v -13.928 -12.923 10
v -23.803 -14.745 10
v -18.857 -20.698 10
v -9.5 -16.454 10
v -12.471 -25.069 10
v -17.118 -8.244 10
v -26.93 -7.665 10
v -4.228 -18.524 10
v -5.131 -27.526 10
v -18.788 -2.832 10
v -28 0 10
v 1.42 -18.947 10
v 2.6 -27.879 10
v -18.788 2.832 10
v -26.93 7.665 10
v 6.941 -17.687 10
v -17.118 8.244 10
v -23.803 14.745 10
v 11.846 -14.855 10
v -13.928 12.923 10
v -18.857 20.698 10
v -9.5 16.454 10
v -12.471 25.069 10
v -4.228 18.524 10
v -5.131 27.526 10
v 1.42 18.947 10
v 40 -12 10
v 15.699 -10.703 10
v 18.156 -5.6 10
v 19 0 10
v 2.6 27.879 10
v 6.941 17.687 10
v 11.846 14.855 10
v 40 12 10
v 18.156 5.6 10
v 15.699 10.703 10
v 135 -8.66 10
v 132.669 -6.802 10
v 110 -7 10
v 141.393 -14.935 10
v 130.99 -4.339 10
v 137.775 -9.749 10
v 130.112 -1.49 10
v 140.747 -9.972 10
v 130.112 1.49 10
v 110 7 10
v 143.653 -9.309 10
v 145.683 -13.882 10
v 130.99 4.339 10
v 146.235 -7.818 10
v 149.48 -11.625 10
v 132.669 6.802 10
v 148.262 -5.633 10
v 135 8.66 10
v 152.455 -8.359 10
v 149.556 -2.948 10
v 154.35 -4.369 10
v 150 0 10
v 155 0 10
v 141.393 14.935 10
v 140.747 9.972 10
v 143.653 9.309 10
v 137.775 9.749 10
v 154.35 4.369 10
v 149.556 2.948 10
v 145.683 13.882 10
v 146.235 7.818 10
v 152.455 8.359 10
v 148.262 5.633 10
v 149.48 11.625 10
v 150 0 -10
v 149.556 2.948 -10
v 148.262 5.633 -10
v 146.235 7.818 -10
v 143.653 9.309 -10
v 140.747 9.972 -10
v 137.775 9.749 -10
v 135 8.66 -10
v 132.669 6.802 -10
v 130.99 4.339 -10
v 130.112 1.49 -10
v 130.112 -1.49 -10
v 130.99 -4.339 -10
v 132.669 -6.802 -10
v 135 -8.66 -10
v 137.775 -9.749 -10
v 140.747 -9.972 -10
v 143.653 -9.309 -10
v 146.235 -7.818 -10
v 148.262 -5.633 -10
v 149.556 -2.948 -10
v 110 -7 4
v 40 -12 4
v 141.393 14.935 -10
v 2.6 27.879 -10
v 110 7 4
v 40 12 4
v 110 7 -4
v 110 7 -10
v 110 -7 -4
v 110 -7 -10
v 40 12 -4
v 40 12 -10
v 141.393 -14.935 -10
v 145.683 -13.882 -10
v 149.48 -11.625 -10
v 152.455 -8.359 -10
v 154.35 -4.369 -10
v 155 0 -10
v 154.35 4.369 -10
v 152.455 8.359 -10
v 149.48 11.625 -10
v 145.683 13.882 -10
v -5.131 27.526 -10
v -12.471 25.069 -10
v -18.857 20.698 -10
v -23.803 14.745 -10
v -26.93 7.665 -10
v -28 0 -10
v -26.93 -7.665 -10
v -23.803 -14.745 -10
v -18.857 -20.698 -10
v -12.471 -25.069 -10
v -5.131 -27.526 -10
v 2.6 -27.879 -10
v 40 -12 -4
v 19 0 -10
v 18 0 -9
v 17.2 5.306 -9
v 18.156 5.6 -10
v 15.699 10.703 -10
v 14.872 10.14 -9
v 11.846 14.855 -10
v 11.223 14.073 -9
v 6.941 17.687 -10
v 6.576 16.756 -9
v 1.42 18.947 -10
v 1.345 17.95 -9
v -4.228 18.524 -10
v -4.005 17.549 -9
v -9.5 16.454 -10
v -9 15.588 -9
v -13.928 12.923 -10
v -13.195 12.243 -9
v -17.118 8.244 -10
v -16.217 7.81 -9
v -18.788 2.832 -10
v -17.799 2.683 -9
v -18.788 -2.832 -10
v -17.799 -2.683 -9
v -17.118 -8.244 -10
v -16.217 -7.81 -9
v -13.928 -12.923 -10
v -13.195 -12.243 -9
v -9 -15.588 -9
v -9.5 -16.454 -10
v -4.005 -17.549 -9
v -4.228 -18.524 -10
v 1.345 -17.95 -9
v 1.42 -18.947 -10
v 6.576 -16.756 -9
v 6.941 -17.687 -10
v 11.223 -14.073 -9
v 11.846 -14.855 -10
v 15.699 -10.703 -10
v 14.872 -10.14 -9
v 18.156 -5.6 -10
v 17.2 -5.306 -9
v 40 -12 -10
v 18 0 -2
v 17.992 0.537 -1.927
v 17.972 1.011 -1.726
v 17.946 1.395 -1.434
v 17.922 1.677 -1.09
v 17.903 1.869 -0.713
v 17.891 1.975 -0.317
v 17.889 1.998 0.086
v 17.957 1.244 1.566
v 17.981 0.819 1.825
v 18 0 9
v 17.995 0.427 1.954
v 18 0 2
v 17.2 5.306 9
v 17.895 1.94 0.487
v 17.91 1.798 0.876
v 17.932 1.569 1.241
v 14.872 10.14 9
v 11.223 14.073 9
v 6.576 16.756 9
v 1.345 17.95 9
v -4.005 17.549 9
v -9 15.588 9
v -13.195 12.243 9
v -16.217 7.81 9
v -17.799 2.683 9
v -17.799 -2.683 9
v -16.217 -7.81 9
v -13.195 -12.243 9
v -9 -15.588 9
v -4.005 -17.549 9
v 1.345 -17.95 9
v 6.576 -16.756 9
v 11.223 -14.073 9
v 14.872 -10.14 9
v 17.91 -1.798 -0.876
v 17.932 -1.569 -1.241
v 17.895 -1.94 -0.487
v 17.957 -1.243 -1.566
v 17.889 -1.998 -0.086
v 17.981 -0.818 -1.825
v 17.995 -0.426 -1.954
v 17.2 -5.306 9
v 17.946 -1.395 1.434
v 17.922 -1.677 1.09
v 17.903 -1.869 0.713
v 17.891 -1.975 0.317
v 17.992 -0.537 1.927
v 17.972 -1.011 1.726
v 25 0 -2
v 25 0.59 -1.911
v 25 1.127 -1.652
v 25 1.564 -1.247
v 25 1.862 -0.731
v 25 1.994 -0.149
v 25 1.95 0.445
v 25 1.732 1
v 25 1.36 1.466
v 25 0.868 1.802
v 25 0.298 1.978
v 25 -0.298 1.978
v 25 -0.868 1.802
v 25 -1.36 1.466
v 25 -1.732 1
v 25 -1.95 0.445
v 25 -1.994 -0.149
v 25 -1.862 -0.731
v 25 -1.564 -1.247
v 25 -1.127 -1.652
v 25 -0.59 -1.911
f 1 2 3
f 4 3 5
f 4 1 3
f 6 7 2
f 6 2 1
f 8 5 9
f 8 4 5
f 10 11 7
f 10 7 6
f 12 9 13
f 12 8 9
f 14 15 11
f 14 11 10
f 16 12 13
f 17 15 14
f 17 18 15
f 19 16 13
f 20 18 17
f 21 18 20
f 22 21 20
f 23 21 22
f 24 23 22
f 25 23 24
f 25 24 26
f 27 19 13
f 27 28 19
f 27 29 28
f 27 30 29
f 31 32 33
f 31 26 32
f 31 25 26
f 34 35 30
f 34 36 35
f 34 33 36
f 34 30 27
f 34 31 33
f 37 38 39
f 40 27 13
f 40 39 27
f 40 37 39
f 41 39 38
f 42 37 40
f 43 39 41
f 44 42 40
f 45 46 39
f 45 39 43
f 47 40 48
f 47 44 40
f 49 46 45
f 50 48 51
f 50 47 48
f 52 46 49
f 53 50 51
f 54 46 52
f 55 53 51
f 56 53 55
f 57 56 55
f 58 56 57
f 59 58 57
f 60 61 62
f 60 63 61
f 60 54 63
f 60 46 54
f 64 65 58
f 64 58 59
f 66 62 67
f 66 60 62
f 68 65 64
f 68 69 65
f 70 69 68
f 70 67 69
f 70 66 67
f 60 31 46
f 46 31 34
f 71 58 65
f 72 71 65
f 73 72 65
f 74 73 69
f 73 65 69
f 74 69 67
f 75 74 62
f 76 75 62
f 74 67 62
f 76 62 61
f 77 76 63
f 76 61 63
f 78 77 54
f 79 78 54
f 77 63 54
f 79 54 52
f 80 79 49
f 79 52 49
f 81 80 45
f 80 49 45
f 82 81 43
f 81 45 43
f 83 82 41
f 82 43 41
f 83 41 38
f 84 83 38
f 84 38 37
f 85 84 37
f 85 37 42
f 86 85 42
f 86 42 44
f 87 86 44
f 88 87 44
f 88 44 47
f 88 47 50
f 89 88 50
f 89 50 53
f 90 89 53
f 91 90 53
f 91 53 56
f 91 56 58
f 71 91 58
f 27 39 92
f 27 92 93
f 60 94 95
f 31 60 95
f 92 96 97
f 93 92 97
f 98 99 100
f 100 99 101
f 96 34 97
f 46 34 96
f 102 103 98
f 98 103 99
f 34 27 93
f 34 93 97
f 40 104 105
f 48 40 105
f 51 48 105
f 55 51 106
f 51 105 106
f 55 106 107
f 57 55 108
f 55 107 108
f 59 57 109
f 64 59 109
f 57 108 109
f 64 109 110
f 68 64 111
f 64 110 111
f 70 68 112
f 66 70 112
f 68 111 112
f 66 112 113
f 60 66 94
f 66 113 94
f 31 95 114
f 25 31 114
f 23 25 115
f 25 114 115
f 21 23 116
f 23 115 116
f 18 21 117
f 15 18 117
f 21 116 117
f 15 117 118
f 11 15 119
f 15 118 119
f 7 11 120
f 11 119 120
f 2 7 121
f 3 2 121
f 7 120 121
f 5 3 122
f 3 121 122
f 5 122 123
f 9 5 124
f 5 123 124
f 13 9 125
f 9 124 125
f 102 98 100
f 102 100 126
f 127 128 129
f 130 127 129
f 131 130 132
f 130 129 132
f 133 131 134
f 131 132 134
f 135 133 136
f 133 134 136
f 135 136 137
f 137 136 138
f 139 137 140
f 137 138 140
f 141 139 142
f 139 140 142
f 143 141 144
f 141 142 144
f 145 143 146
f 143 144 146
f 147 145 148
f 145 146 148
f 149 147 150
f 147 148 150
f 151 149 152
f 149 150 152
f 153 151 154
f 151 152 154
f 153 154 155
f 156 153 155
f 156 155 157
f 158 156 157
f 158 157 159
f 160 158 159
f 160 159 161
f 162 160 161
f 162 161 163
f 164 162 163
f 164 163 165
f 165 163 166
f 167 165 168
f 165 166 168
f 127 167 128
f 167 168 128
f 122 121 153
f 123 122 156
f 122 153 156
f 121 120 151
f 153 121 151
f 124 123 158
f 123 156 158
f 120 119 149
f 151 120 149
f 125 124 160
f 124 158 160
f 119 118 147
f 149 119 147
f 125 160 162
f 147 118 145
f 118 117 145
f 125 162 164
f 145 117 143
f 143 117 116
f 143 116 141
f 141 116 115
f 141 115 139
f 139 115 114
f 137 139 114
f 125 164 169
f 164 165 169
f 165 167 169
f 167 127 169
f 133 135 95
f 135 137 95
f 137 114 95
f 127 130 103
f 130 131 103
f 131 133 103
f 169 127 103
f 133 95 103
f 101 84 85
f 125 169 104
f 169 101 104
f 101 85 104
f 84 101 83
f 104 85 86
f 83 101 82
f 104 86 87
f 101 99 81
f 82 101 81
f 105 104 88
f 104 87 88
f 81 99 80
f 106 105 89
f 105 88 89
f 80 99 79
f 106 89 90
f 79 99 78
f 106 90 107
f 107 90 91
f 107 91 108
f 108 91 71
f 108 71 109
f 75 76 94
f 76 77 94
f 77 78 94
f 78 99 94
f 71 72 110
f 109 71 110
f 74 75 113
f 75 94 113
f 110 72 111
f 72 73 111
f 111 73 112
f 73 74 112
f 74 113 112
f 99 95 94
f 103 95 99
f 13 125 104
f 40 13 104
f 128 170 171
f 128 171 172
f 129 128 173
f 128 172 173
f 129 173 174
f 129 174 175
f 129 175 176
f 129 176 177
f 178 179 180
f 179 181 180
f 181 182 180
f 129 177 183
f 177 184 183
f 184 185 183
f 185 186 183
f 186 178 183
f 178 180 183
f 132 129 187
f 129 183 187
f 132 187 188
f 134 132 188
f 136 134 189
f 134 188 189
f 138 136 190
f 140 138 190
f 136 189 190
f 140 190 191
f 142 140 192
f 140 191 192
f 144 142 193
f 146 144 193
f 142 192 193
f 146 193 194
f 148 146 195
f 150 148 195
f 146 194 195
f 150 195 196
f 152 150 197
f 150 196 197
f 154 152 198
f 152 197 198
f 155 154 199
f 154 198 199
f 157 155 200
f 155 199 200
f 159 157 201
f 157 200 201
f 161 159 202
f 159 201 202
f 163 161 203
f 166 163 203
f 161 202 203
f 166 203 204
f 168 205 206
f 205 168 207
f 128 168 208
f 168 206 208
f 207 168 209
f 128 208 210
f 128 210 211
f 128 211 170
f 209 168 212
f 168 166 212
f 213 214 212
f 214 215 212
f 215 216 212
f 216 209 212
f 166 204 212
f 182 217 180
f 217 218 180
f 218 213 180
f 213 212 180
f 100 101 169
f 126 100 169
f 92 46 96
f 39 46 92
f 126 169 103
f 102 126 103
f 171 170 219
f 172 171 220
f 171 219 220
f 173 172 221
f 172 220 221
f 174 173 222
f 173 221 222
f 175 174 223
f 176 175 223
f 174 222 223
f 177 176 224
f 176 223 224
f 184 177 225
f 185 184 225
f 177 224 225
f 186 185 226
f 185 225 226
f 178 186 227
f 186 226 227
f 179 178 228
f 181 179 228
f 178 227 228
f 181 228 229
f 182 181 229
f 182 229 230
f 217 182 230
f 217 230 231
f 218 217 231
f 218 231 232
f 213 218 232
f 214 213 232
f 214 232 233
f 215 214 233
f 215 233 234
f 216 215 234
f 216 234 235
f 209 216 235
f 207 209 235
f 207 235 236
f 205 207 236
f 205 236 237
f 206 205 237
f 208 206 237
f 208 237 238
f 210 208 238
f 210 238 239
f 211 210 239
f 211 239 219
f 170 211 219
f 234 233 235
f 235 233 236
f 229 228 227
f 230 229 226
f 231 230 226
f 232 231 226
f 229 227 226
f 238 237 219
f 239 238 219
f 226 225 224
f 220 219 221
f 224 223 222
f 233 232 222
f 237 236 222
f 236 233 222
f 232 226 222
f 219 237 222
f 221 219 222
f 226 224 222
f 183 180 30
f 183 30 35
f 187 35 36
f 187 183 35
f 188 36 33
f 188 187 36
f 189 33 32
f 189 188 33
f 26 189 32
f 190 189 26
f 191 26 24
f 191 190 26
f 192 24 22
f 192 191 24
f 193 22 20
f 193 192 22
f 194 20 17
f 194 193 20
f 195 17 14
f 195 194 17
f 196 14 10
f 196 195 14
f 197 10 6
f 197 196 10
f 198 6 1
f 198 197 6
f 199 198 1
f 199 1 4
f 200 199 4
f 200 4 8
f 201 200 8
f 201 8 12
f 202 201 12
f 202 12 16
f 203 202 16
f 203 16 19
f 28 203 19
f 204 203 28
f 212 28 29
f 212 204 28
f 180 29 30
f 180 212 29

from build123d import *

# Parameters (mm, degrees)
EXTRUDE_START       = -10
EXTRUDE_1_DEPTH     = 20
SKETCH_2_R          = 18
CUT_EXTRUDE_1_DEPTH = 159.773423469
SKETCH_3_R          = 10
CUT_EXTRUDE_2_DEPTH = 159.773423469
CUT_EXTRUDE_3_DEPTH = 6
CUT_EXTRUDE_4_DEPTH = 6
CHAMFER_1_SIZE      = 1
SKETCH_7_R          = 2
CUT_EXTRUDE_6_DEPTH = 25


# Read off the part's stored shape, not the designer's step: 凸台-拉伸1
with BuildPart() as part:
    # 凸台-拉伸1 outline → 凸台-拉伸1 (new body)
    with BuildSketch(Plane.XY.offset(EXTRUDE_START)):
        with BuildLine():
            ThreePointArc((2.6, 27.879024373), (-28, 0), (2.6, -27.879024373))
            Line((2.6, -27.879024373), (141.392857143, -14.935191628))
            ThreePointArc((141.392857143, -14.935191628), (155, 0), (141.392857143, 14.935191628))
            Line((141.392857143, 14.935191628), (2.6, 27.879024373))
        make_face()
    extrude(amount=EXTRUDE_1_DEPTH)

    # 草图2 → 切除-拉伸1 (cut, through all)
    with BuildSketch(Plane.XY.offset(10)):
        Circle(SKETCH_2_R)
    extrude(amount=-CUT_EXTRUDE_1_DEPTH, mode=Mode.SUBTRACT)

    # 草图3 → 切除-拉伸2 (cut, through all)
    with BuildSketch(Plane.XY.offset(10)):
        with Locations((140, 0)):
            Circle(SKETCH_3_R)
    extrude(amount=-CUT_EXTRUDE_2_DEPTH, mode=Mode.SUBTRACT)

    # 草图4 → 切除-拉伸3 (cut)
    with BuildSketch(Plane.XY.offset(10)):
        Polygon((40, -12), (40, 12), (110, 7), (110, -7), align=None)
    extrude(amount=-CUT_EXTRUDE_3_DEPTH, mode=Mode.SUBTRACT)

    # 草图5 → 切除-拉伸4 (cut)
    with BuildSketch(Plane.XY.offset(-10)):
        Polygon((40, -12), (40, 12), (110, 7), (110, -7), align=None)
    extrude(amount=CUT_EXTRUDE_4_DEPTH, mode=Mode.SUBTRACT)

    # 倒角1
    chamfer_1_edges = [part.edges().sort_by_distance(p)[0] for p in [
        (-18, 0, -10),
        (-18, 0, 10),
    ]]
    chamfer(chamfer_1_edges, length=CHAMFER_1_SIZE)

    # 草图7 → 切除-拉伸6 (cut)
    with BuildSketch(Plane(origin=(25, 0, 0), x_dir=(0, 0, -1), z_dir=(1, 0, 0))):
        Circle(SKETCH_7_R)
    extrude(amount=-CUT_EXTRUDE_6_DEPTH, mode=Mode.SUBTRACT)


solid = part.part
